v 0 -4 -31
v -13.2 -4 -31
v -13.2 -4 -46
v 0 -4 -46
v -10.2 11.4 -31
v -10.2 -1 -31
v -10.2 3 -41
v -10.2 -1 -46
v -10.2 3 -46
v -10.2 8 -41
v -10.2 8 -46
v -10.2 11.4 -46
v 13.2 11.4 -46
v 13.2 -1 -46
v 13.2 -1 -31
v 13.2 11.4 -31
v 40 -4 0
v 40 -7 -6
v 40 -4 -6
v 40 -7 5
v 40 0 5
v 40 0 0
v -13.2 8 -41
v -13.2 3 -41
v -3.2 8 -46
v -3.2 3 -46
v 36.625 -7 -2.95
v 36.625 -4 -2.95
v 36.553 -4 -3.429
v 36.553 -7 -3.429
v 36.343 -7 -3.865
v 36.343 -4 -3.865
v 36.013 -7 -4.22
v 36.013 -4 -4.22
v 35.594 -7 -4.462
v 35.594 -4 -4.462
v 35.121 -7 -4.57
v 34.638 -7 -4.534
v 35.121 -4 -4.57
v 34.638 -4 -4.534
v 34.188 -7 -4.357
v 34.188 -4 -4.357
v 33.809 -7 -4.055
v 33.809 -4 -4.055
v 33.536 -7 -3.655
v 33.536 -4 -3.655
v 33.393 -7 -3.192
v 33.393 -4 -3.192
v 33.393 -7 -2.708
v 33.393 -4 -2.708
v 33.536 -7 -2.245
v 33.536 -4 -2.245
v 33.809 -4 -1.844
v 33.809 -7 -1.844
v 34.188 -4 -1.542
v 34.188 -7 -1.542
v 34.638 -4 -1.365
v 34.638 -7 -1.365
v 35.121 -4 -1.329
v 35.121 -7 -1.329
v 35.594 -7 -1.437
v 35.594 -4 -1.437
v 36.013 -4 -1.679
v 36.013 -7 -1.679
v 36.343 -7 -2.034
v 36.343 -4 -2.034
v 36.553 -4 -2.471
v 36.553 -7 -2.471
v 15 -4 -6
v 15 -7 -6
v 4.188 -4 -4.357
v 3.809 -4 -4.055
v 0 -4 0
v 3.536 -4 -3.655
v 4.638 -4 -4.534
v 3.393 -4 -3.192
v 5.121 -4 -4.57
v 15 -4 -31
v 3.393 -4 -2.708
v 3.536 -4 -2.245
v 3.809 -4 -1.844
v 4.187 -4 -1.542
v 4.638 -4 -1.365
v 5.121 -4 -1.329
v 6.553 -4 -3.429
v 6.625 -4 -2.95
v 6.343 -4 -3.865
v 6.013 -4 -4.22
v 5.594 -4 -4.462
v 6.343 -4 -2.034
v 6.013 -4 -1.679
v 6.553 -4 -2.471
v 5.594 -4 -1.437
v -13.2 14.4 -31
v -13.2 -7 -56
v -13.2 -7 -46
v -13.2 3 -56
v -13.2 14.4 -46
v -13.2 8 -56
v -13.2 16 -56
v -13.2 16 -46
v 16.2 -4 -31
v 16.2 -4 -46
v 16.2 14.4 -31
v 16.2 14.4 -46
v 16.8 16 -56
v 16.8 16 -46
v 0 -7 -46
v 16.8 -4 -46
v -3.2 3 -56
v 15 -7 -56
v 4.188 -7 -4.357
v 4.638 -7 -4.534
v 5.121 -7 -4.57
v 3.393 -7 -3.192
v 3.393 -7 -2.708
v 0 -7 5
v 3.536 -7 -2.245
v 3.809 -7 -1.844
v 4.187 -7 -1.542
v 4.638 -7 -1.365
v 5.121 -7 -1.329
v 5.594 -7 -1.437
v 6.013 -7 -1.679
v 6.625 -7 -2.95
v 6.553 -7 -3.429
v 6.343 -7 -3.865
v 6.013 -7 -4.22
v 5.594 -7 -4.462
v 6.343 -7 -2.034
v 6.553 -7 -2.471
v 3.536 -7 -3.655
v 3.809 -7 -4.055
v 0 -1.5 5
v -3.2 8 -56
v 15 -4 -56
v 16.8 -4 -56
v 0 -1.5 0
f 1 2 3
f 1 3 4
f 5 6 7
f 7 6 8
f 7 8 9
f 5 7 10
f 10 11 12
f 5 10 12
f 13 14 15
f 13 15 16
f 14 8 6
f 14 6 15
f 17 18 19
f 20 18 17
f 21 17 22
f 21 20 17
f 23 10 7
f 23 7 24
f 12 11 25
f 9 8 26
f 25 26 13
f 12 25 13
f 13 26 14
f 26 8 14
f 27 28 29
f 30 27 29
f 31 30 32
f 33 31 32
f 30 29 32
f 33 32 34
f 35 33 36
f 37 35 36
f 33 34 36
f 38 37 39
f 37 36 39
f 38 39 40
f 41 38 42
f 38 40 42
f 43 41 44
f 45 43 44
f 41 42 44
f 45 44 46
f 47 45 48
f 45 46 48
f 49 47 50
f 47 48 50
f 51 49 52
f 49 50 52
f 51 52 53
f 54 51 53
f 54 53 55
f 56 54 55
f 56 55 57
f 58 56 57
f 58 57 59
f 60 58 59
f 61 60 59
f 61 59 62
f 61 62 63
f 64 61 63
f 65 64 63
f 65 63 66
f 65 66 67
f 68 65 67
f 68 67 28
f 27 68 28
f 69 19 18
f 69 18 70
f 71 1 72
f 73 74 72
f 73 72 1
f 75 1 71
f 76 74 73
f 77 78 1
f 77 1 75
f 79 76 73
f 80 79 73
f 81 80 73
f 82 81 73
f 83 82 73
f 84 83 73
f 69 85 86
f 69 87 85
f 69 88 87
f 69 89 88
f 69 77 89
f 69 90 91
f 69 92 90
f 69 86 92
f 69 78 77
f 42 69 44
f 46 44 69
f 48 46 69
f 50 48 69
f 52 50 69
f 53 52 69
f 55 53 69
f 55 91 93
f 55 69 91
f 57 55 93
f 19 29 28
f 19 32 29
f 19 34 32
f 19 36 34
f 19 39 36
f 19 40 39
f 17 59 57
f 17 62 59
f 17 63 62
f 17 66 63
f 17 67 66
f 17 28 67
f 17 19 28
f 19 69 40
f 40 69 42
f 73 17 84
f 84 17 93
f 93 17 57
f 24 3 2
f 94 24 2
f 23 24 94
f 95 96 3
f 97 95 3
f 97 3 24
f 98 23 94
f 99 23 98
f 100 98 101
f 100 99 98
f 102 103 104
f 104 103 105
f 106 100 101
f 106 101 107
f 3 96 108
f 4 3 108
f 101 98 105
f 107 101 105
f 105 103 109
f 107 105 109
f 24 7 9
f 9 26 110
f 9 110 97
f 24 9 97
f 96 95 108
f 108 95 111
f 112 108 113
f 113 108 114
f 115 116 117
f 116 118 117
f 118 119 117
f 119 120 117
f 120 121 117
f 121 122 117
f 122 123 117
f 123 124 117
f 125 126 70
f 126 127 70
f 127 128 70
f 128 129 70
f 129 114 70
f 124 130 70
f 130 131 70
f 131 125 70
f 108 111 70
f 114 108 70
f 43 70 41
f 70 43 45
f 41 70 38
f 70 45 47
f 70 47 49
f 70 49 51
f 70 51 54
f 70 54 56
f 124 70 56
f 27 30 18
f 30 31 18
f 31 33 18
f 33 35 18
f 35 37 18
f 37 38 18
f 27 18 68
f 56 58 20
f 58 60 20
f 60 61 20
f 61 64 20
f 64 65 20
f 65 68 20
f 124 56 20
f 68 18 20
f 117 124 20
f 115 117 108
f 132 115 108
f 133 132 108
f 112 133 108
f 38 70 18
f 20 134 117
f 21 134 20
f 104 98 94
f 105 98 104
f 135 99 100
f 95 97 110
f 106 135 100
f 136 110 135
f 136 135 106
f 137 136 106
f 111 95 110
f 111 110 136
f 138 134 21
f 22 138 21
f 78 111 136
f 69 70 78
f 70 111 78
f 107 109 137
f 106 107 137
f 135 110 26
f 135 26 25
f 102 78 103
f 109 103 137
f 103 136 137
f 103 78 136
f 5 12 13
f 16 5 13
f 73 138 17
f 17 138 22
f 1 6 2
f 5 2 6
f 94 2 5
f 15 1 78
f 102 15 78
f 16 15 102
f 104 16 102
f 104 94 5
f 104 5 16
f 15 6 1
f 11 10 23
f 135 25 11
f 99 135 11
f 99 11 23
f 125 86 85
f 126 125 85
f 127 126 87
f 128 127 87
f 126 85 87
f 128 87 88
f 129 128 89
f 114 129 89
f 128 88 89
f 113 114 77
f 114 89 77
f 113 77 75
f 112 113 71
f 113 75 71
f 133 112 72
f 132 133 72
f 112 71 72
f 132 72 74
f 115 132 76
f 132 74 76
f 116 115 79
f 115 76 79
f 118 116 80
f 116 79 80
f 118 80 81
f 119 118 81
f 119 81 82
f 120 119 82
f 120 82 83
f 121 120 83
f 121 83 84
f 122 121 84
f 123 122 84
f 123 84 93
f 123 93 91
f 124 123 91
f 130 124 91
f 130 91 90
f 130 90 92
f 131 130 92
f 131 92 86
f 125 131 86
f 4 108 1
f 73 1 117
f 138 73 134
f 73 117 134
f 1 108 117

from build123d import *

# Parameters (mm, degrees)
ESQUISSE1_W             = 40
ESQUISSE1_H             = 7
BOSS_EXTRU_1_DEPTH      = 5
ENL_V_MAT_EXTRU_2_DEPTH = 6
ESQUISSE4_W             = 40
ESQUISSE4_H             = 3
BOSS_EXTRU_2_DEPTH      = 6
ESQUISSE5_R             = 1.625
ENL_V_MAT_EXTRU_3_DEPTH = 6
ESQUISSE6_W             = 15
ESQUISSE6_H             = 3
BOSS_EXTRU_3_DEPTH      = 50
ESQUISSE7_W             = 10
ESQUISSE7_H             = 3
BOSS_EXTRU_4_DEPTH      = 13.2
ESQUISSE8_W             = 30
ESQUISSE8_H             = 10
BOSS_EXTRU_5_DEPTH      = 20
ESQUISSE9_W             = 29.4
ESQUISSE9_H             = 18.4
ESQUISSE9_W_2           = 23.4
ESQUISSE9_H_2           = 12.4
BOSS_EXTRU_6_DEPTH      = 15
ESQUISSE11_W            = 10
ESQUISSE11_H            = 5
ENL_V_MAT_EXTRU_5_DEPTH = 15


with BuildPart() as part:
    # Esquisse1 → Boss.-Extru.1 (new body)
    with BuildSketch(Plane.XY):
        with Locations((20, -3.5)):
            Rectangle(ESQUISSE1_W, ESQUISSE1_H)
    extrude(amount=BOSS_EXTRU_1_DEPTH)

    # Esquisse3 → Enlèv. mat.-Extru.2 (cut, through all)
    with BuildSketch(Plane.XY.offset(5)):
        Polygon((40, 0), (0, 0), (0, -1.5), align=None)
    extrude(amount=-ENL_V_MAT_EXTRU_2_DEPTH, mode=Mode.SUBTRACT)

    # Esquisse4 → Boss.-Extru.2 (add)
    with BuildSketch(Plane(origin=(0, 0, 0), x_dir=(-1, 0, 0), z_dir=(0, 0, -1))):
        with Locations((-20, -5.5)):
            Rectangle(ESQUISSE4_W, ESQUISSE4_H)
    extrude(amount=BOSS_EXTRU_2_DEPTH)

    # Esquisse5 → Enlèv. mat.-Extru.3 (cut)
    with BuildSketch(Plane(origin=(0, -4, 0), x_dir=(1, 0, 0), z_dir=(0, 1, 0))):
        with Locations((35, 2.949699752)):
            Circle(ESQUISSE5_R)
        with Locations((5, 2.949699752)):
            Circle(ESQUISSE5_R)
    extrude(amount=-ENL_V_MAT_EXTRU_3_DEPTH, mode=Mode.SUBTRACT)

    # Esquisse6 → Boss.-Extru.3 (add)
    with BuildSketch(Plane(origin=(0, 0, -6), x_dir=(-1, 0, 0), z_dir=(0, 0, -1))):
        with Locations((-7.5, -5.5)):
            Rectangle(ESQUISSE6_W, ESQUISSE6_H)
    extrude(amount=BOSS_EXTRU_3_DEPTH)

    # Esquisse7 → Boss.-Extru.4 (add)
    with BuildSketch(Plane.ZY):
        with Locations((-51, -5.5)):
            Rectangle(ESQUISSE7_W, ESQUISSE7_H)
    extrude(amount=BOSS_EXTRU_4_DEPTH)

    # Esquisse8 → Boss.-Extru.5 (add)
    with BuildSketch(Plane(origin=(0, -4, 0), x_dir=(1, 0, 0), z_dir=(0, 1, 0))):
        with Locations((1.8, 51)):
            Rectangle(ESQUISSE8_W, ESQUISSE8_H)
    extrude(amount=BOSS_EXTRU_5_DEPTH)

    # Esquisse9 → Boss.-Extru.6 (add)
    with BuildSketch(Plane.XY.offset(-46)):
        with Locations((1.5, 5.2)):
            Rectangle(ESQUISSE9_W, ESQUISSE9_H)
        with Locations((1.5, 5.2)):
            Rectangle(ESQUISSE9_W_2, ESQUISSE9_H_2, mode=Mode.SUBTRACT)
    extrude(amount=BOSS_EXTRU_6_DEPTH)

    # Esquisse11 → Enlèv. mat.-Extru.5 (cut)
    with BuildSketch(Plane(origin=(0, 0, -56), x_dir=(-1, 0, 0), z_dir=(0, 0, -1))):
        with Locations((8.2, 5.5)):
            Rectangle(ESQUISSE11_W, ESQUISSE11_H)
    extrude(amount=-ENL_V_MAT_EXTRU_5_DEPTH, mode=Mode.SUBTRACT)


solid = part.part
